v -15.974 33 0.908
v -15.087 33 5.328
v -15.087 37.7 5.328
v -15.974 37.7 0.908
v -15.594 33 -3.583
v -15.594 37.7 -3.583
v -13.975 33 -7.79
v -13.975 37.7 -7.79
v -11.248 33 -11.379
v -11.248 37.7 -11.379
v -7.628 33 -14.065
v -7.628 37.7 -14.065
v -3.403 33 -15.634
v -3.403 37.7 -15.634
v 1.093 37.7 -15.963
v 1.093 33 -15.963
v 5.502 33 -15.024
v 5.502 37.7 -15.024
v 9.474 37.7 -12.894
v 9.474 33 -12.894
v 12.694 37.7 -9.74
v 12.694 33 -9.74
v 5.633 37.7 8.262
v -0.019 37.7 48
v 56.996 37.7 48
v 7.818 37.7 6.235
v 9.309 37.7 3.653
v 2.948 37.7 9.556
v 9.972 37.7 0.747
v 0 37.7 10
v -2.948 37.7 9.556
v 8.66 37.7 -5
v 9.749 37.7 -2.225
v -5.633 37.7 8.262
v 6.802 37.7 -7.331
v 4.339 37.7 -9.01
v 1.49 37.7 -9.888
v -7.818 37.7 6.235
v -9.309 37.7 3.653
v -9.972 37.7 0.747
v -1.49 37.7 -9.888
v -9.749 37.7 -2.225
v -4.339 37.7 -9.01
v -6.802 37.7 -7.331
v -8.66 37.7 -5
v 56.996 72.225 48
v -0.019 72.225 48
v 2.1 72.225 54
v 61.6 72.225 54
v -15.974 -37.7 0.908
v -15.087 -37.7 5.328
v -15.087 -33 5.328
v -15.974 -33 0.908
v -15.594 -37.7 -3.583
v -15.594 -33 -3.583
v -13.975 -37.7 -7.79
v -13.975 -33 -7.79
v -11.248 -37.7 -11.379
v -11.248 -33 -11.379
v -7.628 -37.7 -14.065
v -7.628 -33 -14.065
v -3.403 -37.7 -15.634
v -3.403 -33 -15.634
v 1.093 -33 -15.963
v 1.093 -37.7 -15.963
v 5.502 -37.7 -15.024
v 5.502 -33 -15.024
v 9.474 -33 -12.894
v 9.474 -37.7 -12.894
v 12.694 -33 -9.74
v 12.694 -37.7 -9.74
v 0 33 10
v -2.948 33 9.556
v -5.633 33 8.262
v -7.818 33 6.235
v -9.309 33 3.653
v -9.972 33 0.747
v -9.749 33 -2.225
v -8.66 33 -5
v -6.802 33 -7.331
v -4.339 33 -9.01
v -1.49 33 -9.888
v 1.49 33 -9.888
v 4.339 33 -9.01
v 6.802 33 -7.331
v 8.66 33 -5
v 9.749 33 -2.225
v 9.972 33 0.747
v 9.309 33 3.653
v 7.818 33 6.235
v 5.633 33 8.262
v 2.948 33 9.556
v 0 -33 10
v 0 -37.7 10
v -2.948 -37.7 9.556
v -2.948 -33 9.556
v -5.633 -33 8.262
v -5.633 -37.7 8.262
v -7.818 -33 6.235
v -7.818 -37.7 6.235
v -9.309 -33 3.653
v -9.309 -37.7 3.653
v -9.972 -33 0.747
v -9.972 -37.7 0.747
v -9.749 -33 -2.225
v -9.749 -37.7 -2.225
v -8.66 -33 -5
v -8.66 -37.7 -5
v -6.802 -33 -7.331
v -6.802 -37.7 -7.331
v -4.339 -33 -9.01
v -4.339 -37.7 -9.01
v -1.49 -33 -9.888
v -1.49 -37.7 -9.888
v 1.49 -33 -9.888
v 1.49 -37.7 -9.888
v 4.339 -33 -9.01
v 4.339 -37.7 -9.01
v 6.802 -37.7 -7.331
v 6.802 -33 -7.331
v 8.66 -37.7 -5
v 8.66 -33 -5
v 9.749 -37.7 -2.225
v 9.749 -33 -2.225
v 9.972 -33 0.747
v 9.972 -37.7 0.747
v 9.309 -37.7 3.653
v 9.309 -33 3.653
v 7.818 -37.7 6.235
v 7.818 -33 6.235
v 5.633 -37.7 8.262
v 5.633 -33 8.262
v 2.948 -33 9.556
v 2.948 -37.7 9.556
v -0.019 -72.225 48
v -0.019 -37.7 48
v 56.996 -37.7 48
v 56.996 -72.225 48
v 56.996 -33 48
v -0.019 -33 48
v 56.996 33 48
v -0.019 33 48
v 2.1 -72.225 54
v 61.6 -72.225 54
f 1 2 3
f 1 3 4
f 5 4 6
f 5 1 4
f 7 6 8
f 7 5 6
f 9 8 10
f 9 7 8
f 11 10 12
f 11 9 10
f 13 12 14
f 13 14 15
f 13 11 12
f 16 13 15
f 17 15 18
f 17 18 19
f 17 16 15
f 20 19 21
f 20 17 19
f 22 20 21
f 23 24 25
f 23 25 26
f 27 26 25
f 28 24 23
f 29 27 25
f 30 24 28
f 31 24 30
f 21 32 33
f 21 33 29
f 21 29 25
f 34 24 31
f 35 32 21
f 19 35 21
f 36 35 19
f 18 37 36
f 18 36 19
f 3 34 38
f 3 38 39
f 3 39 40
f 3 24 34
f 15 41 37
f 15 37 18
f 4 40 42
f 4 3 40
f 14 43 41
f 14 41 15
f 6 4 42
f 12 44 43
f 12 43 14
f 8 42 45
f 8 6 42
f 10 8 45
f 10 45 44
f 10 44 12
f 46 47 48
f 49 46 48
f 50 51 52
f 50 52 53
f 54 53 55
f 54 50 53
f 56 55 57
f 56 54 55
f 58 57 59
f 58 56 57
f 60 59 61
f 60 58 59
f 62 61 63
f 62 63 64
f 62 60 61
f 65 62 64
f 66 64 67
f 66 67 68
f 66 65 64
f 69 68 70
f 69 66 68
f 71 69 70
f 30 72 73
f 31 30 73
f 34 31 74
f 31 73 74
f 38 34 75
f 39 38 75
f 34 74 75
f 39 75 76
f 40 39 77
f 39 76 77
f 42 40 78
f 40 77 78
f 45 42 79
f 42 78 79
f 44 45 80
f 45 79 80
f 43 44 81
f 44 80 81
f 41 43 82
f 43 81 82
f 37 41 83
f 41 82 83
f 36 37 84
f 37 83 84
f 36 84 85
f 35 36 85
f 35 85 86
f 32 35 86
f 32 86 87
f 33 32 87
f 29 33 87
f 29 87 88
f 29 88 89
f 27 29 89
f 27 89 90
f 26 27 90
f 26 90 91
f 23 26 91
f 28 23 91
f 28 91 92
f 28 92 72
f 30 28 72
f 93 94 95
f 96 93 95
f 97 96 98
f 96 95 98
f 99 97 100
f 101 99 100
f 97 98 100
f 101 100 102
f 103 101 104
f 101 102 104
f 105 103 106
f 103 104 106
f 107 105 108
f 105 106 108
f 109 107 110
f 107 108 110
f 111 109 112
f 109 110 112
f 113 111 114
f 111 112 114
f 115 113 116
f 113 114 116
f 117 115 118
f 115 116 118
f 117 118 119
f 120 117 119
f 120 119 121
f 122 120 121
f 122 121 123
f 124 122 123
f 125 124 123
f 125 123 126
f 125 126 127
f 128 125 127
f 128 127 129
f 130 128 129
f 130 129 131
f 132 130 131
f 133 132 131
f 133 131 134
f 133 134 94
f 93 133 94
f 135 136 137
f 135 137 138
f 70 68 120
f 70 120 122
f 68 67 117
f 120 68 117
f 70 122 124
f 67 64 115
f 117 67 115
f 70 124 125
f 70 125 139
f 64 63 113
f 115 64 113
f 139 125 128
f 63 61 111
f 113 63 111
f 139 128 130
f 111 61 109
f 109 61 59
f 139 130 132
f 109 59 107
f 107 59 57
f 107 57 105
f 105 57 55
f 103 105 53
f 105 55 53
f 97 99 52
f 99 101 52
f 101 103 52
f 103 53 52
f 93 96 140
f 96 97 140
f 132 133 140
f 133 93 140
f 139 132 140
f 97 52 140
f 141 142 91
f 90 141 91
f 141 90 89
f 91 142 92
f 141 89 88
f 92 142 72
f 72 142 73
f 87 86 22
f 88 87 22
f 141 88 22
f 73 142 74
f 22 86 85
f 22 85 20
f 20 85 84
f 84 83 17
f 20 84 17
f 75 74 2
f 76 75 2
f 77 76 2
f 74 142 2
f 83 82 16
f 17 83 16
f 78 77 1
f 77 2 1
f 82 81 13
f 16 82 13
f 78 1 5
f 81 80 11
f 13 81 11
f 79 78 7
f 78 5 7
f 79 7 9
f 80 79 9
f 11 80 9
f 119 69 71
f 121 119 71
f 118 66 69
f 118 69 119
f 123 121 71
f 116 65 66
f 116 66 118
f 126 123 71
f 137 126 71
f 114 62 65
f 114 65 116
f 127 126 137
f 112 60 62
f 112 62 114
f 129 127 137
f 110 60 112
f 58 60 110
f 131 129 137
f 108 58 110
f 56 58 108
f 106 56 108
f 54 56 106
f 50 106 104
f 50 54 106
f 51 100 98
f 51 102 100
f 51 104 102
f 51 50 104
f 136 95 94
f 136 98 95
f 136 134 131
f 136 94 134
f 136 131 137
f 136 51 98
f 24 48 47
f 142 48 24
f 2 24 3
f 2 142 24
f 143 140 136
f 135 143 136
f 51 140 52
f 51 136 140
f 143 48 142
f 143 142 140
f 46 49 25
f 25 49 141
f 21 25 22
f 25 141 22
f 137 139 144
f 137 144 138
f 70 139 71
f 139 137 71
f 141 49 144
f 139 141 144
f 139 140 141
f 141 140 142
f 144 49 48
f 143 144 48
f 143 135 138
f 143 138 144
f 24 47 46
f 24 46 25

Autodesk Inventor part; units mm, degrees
ref_plane "YZ Plane" through (0, 0, 0) normal (1, 0, 0) x (0, 1, 0)
ref_plane "XZ Plane" through (0, 0, 0) normal (0, 1, 0) x (-1, 0, 0)
sketch "Sketch1" plane through (0, 0, 0) normal (1, 0, 0) x (0, 1, 0)
  circle A0 centre (0, 0) radius 10
  arc A1 (-9.7398, 12.694) -> (5.3275, -15.087) centre (0, 0) ccw
  line L0 (0, 0) -> (0, 61.6) construction
  line L1 (0, 0) -> (54, 0) construction
  line L2 (0, 61.6) -> (54, 61.6) construction
  line L3 (54, 0) -> (54, 61.6) construction
  line L4 (54, 61.6) -> (54, 2.1)
  line L5 (54, 61.6) -> (-9.7398, 12.694)
  line L6 (54, 2.1) -> (5.3275, -15.087)
  dimension "d0" = 20
  dimension "d2" = 32
  dimension "d3" = 61.6
  dimension "d4" = 54
  dimension "d5" = 59.5
extrude "Extrusion1" add sketch "Sketch1" along normal blind 144.45
sketch "Sketch2" plane through (0, 0, 0) normal (0, 0, 1) x (1, 0, 0)
  line L0 (0, 54) -> (144.45, 54) projected
  line L1 (0, -9.7398) -> (0, 54) projected
  line L2 (0, -9.7398) -> (144.45, -9.7398) projected
  line L3 (144.45, 54) -> (144.45, -9.7398) projected
  line L4 (0, 54) -> (144.45, 54) projected
  line L5 (72.225, 54) -> (72.225, -21.6932)
  line L6 (39.225, 48) -> (105.225, 48)
  line L7 (105.225, 48) -> (105.225, -39.8615)
  line L8 (105.225, -39.8615) -> (39.225, -39.8615)
  line L9 (39.225, -39.8615) -> (39.225, 48)
  line L10 (72.225, 48) -> (72.225, -39.8615)
  point P0 (0, 0)
  dimension "d8" = 66
  dimension "d10" = 6
extrude "Extrusion2" cut sketch "Sketch2" along normal mid plane 144.45 contours L6 L7 L2 L5 | L5 L2 L9 L6 | L2 L5 L10 L8 L9 | L2 L7 L8 L10 L5
ref_plane "Work Plane1" through (72.225, 0, 0) normal (1, 0, 0) x (0, 0, -1)
sketch "Sketch3" plane through (0, 0, 0) normal (0, 0, 1) x (1, 0, 0)
  line L0 (0, 54) -> (144.45, 54) projected
  line L1 (144.45, 54) -> (144.45, -9.7398) projected
  line L2 (105.225, 48) -> (105.225, -9.7398) projected
  line L3 (105.225, -9.7398) -> (144.45, -9.7398) projected
  line L4 (144.45, 54) -> (144.45, -9.7398) projected
  line L5 (0, 54) -> (144.45, 54) projected
  line L6 (0, -9.7398) -> (0, 54) projected
  line L7 (0, -9.7398) -> (39.225, -9.7398) projected
  line L8 (39.225, -9.7398) -> (39.225, 48) projected
  line L9 (39.225, 48) -> (105.225, 48) projected
  line L10 (144.45, 48) -> (109.925, 48)
  line L11 (109.925, 48) -> (109.925, -25.7164)
  line L12 (109.925, -25.7164) -> (144.45, -25.7164)
  line L13 (144.45, -25.7164) -> (144.45, 48)
  line L14 (39.225, 48) -> (105.225, 48) projected
  point P0 (0, 0)
  dimension "d14" = 34.525
extrude "Extrusion3" cut sketch "Sketch3" along normal through all both and the other way through all contours L1 L3 L11 L10 | L13 L12 L11 L3
mirror "Mirror1" about plane through (72.225, 0, 0) normal (1, 0, 0) of "Extrusion3"
move or copy body "Move Body1" bodies to move or copy 1 copy no translate (-72.225, 0, 0)
move or copy body "Move Body2" bodies to move or copy 1 copy no rotation origin (0, 0, 0) rotation axis (1, 0, 0) rotation angle 90
move or copy body "Move Body4" bodies to move or copy 1 copy no rotation origin (0, 0, 0) rotation axis (0, 0, 1) rotation angle 90
properties part number "Head_v2"
